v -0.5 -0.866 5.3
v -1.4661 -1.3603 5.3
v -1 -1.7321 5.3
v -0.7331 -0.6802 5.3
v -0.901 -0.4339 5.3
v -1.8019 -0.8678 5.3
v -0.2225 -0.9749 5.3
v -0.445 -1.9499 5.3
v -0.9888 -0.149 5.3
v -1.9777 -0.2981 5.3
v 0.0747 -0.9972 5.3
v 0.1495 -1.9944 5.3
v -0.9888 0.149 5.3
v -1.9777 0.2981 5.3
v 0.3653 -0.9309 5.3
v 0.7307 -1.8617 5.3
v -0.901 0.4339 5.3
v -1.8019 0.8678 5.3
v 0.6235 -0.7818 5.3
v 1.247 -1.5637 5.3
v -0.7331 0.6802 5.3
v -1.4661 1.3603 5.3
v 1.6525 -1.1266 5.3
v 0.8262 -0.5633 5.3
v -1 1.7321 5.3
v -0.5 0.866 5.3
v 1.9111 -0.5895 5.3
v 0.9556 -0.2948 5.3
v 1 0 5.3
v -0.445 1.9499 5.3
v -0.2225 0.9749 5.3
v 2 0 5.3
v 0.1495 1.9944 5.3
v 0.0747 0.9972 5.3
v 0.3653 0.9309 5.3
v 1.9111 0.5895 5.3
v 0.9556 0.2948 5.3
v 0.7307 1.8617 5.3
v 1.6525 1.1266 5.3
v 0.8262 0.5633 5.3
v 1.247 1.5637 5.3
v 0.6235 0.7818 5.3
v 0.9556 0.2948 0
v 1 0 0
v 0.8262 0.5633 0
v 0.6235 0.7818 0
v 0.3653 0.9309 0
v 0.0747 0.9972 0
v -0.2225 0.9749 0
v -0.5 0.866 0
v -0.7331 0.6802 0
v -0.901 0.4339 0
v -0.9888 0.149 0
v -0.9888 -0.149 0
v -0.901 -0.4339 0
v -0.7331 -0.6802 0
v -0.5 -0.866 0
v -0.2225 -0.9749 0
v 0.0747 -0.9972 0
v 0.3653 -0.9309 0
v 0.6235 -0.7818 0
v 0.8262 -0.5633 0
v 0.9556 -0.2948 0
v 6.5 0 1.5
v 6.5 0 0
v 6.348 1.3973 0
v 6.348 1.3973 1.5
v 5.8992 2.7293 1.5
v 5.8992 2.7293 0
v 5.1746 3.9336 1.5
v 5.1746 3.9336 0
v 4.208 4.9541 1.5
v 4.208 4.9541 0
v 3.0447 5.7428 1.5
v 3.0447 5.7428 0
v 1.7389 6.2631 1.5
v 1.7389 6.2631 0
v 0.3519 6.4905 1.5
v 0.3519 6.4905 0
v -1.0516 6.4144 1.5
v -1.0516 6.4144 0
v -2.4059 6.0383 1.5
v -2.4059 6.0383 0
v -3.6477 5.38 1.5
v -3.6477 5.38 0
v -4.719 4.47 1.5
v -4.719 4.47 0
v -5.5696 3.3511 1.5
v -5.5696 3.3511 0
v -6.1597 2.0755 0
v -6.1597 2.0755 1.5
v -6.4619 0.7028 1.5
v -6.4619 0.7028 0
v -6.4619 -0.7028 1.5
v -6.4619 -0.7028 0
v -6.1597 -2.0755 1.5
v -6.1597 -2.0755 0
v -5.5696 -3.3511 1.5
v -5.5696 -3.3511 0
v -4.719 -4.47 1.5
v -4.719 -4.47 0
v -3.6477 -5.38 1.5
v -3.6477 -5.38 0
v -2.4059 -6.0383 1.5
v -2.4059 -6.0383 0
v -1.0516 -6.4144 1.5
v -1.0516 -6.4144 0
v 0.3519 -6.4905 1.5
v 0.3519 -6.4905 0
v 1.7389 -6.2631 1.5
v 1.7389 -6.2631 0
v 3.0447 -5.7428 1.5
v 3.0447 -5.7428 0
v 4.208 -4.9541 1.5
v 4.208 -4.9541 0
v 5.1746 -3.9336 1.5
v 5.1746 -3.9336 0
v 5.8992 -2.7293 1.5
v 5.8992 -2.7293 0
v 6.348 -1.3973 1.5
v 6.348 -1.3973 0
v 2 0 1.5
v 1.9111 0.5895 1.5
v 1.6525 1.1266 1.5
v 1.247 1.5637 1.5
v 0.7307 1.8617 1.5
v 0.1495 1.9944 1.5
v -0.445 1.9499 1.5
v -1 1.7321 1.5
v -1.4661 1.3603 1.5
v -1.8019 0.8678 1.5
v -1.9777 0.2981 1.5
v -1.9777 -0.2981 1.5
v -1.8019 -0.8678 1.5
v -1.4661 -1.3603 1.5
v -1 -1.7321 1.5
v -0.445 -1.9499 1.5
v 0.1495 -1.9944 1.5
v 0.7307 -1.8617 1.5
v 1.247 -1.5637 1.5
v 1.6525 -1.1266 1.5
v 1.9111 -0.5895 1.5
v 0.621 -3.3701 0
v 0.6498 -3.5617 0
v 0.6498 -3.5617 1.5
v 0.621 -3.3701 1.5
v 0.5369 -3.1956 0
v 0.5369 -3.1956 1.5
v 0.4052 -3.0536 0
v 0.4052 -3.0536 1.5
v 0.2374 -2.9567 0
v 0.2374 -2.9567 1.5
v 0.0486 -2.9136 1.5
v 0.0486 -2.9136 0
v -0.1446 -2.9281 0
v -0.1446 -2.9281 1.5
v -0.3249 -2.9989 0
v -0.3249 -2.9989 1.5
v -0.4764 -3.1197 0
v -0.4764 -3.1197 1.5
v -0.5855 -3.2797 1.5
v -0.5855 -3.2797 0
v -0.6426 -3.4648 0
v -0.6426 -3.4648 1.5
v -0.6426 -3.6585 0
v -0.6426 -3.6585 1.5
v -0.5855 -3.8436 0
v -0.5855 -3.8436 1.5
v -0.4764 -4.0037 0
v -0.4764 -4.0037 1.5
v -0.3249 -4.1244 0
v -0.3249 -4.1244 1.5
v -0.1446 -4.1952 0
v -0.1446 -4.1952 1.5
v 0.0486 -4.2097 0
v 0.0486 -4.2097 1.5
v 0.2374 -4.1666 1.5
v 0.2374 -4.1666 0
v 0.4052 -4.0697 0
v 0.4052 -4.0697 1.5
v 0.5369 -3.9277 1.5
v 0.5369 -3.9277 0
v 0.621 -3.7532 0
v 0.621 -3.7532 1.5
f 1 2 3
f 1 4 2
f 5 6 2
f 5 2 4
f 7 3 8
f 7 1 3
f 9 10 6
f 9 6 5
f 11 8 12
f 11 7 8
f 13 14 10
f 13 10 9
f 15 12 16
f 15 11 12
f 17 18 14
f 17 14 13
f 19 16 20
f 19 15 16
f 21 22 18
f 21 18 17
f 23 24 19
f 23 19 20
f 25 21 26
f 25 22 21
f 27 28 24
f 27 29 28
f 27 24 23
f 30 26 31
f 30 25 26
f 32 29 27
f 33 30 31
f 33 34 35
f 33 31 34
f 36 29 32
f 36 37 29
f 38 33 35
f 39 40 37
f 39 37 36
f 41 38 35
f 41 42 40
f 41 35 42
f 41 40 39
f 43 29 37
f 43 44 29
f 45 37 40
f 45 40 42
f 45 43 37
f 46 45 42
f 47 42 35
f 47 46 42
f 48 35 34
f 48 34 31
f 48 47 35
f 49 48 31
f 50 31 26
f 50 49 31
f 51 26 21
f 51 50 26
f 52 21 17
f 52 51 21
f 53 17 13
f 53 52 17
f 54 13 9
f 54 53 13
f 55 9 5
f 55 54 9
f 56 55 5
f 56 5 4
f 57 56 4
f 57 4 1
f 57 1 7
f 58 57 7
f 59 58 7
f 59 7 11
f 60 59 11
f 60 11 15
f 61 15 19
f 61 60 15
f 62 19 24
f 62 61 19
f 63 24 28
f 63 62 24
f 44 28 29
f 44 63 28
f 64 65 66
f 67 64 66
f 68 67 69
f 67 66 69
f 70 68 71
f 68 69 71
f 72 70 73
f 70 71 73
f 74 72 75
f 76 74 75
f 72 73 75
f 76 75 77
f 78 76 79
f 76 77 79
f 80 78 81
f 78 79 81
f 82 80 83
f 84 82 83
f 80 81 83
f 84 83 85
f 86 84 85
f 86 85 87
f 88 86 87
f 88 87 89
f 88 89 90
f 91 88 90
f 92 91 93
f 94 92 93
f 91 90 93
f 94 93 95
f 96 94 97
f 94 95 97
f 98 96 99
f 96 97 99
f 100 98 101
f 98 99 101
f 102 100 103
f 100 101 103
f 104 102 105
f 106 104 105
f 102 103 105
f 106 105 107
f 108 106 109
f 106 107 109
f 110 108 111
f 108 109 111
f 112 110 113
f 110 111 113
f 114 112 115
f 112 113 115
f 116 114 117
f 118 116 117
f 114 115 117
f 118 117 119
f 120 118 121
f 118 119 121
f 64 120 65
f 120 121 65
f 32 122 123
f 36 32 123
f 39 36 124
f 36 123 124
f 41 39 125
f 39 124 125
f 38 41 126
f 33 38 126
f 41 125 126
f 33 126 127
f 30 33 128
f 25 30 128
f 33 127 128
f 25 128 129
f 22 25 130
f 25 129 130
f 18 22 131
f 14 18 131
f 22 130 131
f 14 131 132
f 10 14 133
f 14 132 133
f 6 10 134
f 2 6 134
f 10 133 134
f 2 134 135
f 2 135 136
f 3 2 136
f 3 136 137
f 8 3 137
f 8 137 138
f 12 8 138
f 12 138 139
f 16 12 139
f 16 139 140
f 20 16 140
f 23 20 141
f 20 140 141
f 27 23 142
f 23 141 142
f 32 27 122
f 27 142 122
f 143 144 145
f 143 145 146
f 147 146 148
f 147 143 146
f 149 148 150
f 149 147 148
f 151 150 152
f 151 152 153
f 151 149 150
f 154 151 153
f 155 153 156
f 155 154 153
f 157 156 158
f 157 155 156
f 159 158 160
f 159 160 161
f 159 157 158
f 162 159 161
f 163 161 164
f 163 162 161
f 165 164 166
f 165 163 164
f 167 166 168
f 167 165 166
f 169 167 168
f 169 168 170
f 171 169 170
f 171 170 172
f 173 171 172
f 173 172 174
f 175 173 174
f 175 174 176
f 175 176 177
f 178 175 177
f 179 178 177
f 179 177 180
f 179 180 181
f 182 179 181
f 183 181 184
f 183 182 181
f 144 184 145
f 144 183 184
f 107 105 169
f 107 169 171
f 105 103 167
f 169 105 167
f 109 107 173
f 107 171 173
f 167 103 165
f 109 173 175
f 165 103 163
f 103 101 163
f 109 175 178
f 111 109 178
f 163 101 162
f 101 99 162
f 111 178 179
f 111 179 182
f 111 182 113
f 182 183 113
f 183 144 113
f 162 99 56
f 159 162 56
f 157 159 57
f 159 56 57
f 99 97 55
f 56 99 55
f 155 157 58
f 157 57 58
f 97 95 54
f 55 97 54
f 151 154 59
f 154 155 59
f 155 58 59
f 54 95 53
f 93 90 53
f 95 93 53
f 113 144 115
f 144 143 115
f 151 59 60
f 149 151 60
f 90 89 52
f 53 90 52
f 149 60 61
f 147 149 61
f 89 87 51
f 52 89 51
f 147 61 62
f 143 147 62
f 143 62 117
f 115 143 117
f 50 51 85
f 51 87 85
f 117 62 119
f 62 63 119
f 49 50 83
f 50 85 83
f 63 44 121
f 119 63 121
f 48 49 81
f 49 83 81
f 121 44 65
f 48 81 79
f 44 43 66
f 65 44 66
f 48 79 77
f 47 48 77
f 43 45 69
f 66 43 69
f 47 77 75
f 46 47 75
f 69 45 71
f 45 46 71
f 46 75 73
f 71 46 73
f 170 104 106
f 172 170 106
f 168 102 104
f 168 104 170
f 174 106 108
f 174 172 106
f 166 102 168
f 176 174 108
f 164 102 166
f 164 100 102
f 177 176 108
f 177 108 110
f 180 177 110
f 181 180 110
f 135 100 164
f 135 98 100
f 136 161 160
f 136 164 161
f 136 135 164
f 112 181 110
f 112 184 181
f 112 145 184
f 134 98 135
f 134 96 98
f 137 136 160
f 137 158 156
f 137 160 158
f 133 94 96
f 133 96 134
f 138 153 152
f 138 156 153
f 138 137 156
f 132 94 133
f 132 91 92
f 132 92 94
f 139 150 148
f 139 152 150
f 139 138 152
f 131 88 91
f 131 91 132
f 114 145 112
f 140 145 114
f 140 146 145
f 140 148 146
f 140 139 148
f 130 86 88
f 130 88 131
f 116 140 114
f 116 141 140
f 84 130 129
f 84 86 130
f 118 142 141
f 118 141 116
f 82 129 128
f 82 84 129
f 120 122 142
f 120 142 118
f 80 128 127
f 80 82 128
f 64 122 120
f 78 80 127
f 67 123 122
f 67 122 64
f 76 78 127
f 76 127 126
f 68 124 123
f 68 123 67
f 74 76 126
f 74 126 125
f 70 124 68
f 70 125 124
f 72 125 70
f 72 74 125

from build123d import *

# Parameters (mm, degrees)
F0_R     = 6.5
F0_R_2   = 1
F1_DEPTH = 1.5
F2_R     = 2
F2_R_2   = 1
F3_DEPTH = 3.8
F4_R     = 0.6498381819
F5_DEPTH = 1.5


# Not quite as in the source:
# - a feature names something its author has since deleted; it is built from what else it names


with BuildPart() as f1:
    # F0 (on Top) → F1 (new body)
    with BuildSketch(Plane.XY):
        Circle(F0_R)
        Circle(F0_R_2, mode=Mode.SUBTRACT)
    extrude(amount=F1_DEPTH)

    # F2 (on face) → F3 (join)
    with BuildSketch(Plane.XY.offset(1.5)):
        Circle(F2_R)
        Circle(F2_R_2, mode=Mode.SUBTRACT)
    extrude(amount=F3_DEPTH)

    # F4 (on Top) → F5 (cut, through all)
    with BuildSketch(Plane.XY):
        with Locations((0, -3.5616646055)):
            Circle(F4_R)
    extrude(amount=F5_DEPTH, mode=Mode.SUBTRACT)


solid = f1.part
